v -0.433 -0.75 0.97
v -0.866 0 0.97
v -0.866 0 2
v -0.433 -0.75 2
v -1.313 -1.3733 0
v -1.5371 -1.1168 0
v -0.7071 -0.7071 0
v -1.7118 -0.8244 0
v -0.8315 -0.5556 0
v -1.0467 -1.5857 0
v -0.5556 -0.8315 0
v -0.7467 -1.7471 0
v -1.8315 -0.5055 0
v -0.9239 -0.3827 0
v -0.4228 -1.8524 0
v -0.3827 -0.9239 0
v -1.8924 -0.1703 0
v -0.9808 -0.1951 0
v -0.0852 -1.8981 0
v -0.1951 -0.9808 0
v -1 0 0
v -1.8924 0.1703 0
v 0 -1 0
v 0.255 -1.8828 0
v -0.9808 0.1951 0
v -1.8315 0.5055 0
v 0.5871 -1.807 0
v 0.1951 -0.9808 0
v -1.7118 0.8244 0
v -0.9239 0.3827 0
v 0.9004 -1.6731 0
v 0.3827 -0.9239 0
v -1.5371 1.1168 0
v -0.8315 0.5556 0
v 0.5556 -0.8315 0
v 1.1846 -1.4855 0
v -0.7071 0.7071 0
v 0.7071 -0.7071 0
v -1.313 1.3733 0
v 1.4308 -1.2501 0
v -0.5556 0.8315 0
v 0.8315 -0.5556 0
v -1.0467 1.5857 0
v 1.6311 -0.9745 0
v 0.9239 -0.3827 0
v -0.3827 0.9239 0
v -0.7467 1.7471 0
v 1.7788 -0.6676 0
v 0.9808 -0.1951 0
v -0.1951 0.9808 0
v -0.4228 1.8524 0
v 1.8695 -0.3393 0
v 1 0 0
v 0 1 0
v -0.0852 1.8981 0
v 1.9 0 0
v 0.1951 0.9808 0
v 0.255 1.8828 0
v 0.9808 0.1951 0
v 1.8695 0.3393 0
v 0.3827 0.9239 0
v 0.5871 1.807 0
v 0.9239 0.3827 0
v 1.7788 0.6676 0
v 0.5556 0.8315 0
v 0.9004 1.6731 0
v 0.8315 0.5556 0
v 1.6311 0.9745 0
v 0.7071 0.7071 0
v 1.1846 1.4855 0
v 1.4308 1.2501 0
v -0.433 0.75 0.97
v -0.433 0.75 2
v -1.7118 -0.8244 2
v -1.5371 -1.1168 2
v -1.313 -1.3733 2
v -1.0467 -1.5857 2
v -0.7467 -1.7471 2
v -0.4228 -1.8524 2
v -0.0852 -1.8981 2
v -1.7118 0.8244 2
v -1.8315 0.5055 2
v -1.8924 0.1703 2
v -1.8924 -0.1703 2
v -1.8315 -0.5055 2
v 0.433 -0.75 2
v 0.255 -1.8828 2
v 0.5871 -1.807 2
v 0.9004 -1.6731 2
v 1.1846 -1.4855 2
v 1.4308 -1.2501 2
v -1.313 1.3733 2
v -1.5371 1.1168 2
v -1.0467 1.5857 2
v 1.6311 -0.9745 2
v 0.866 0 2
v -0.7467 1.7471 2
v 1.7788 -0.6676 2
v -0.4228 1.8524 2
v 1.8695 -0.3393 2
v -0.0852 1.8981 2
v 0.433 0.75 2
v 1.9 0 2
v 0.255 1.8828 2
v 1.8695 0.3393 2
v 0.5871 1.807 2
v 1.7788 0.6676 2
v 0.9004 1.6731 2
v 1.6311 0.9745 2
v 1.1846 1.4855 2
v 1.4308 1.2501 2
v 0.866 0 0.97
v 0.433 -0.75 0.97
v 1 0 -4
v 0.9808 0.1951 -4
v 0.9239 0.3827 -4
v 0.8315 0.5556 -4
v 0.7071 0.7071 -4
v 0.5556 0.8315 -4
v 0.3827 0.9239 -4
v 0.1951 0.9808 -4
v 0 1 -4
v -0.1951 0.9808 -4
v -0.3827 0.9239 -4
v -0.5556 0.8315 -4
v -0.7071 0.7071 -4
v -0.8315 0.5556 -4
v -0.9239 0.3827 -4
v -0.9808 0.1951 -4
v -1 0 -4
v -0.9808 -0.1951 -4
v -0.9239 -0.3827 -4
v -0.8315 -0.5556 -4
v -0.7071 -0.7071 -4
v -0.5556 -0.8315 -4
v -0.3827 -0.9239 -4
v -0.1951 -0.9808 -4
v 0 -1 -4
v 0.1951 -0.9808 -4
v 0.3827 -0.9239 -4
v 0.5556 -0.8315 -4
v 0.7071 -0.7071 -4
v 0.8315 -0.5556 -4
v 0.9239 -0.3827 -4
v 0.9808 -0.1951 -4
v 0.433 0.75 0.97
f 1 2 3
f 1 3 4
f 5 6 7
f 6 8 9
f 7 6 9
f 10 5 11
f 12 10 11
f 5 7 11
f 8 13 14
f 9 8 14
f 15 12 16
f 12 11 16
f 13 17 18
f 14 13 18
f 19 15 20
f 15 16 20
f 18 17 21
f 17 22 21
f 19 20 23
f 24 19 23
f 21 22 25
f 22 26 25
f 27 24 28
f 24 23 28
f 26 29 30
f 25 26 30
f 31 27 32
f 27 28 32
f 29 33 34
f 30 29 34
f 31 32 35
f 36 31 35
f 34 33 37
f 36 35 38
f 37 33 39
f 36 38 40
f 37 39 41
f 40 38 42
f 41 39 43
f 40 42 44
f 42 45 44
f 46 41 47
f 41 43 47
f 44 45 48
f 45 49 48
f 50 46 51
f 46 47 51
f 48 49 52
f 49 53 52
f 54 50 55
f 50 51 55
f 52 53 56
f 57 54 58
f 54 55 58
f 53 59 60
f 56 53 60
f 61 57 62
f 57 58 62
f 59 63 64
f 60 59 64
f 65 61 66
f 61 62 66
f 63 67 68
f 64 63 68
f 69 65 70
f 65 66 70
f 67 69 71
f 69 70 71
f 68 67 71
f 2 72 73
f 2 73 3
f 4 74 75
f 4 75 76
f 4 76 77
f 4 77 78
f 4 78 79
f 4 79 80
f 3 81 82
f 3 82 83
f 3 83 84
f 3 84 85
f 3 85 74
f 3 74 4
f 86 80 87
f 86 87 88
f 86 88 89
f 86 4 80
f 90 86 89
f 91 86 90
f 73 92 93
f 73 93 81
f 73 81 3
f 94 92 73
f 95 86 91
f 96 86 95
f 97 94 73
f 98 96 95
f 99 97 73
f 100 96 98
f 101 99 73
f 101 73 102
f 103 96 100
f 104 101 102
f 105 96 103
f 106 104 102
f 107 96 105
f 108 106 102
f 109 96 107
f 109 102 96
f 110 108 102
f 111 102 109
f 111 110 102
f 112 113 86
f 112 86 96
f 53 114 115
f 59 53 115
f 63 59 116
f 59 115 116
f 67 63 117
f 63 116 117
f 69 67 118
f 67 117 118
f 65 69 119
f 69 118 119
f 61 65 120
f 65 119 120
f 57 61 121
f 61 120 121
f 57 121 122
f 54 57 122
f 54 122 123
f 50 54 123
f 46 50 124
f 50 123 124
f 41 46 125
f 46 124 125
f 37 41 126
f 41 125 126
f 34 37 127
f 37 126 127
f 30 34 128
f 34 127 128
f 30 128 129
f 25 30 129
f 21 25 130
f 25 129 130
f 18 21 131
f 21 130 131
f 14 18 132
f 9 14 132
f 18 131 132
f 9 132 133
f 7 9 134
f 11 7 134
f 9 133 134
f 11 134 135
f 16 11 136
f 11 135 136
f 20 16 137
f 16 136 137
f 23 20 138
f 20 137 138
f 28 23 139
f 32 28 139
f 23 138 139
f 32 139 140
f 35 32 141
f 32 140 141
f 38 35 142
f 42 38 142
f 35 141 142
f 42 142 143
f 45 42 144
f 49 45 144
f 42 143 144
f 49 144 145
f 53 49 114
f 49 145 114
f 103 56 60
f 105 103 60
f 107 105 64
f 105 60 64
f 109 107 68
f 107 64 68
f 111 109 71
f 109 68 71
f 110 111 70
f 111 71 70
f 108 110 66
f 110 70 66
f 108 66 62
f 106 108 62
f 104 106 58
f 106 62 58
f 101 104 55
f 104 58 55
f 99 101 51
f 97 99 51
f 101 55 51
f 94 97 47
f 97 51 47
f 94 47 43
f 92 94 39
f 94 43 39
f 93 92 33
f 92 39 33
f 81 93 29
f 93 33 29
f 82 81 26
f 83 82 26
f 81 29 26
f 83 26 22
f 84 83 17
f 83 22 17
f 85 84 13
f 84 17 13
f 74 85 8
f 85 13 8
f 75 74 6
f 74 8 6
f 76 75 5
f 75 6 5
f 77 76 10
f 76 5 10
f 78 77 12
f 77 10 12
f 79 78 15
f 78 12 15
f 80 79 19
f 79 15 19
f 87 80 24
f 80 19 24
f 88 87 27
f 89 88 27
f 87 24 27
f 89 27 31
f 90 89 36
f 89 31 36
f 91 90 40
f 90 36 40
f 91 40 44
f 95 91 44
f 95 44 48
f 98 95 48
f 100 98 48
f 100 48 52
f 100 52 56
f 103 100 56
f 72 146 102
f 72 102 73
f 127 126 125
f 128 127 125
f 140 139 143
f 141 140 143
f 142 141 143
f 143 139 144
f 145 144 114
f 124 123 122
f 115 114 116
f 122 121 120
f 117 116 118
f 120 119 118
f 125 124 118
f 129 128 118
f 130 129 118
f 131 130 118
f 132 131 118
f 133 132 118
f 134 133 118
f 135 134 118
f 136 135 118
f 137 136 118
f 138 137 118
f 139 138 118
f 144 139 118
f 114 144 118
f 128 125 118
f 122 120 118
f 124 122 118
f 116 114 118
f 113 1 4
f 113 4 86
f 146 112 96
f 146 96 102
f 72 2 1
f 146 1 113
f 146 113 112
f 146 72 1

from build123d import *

# Parameters (mm, degrees)
ISO4762_HEAD_SKETCH_R                   = 1.9
ISO4762_HEAD_DEPTH                      = 2
THREAD_MAJOR_DIAMETER_ENVELOPE_START    = -4
THREAD_MAJOR_DIAMETER_ENVELOPE_SKETCH_R = 1
THREAD_MAJOR_DIAMETER_ENVELOPE_DEPTH    = 4
HEX_SOCKET_START                        = 0.97
HEX_SOCKET_DEPTH                        = 1.03


with BuildPart() as part:
    # ISO4762_head_Sketch → ISO4762_head (new body)
    with BuildSketch(Plane.XY):
        Circle(ISO4762_HEAD_SKETCH_R)
    extrude(amount=ISO4762_HEAD_DEPTH)

    # Thread_major_diameter_envelope_Sketch → Thread_major_diameter_envelope (add)
    with BuildSketch(Plane.XY.offset(THREAD_MAJOR_DIAMETER_ENVELOPE_START)):
        Circle(THREAD_MAJOR_DIAMETER_ENVELOPE_SKETCH_R)
    extrude(amount=THREAD_MAJOR_DIAMETER_ENVELOPE_DEPTH)

    # Hex_socket_Sketch → Hex_socket (cut)
    with BuildSketch(Plane.XY.offset(HEX_SOCKET_START)):
        Polygon((0.866025404, 0), (0.433012702, 0.75), (-0.433012702, 0.75), (-0.866025404, 0), (-0.433012702, -0.75), (0.433012702, -0.75), align=None)
    extrude(amount=HEX_SOCKET_DEPTH, mode=Mode.SUBTRACT)


solid = part.part
